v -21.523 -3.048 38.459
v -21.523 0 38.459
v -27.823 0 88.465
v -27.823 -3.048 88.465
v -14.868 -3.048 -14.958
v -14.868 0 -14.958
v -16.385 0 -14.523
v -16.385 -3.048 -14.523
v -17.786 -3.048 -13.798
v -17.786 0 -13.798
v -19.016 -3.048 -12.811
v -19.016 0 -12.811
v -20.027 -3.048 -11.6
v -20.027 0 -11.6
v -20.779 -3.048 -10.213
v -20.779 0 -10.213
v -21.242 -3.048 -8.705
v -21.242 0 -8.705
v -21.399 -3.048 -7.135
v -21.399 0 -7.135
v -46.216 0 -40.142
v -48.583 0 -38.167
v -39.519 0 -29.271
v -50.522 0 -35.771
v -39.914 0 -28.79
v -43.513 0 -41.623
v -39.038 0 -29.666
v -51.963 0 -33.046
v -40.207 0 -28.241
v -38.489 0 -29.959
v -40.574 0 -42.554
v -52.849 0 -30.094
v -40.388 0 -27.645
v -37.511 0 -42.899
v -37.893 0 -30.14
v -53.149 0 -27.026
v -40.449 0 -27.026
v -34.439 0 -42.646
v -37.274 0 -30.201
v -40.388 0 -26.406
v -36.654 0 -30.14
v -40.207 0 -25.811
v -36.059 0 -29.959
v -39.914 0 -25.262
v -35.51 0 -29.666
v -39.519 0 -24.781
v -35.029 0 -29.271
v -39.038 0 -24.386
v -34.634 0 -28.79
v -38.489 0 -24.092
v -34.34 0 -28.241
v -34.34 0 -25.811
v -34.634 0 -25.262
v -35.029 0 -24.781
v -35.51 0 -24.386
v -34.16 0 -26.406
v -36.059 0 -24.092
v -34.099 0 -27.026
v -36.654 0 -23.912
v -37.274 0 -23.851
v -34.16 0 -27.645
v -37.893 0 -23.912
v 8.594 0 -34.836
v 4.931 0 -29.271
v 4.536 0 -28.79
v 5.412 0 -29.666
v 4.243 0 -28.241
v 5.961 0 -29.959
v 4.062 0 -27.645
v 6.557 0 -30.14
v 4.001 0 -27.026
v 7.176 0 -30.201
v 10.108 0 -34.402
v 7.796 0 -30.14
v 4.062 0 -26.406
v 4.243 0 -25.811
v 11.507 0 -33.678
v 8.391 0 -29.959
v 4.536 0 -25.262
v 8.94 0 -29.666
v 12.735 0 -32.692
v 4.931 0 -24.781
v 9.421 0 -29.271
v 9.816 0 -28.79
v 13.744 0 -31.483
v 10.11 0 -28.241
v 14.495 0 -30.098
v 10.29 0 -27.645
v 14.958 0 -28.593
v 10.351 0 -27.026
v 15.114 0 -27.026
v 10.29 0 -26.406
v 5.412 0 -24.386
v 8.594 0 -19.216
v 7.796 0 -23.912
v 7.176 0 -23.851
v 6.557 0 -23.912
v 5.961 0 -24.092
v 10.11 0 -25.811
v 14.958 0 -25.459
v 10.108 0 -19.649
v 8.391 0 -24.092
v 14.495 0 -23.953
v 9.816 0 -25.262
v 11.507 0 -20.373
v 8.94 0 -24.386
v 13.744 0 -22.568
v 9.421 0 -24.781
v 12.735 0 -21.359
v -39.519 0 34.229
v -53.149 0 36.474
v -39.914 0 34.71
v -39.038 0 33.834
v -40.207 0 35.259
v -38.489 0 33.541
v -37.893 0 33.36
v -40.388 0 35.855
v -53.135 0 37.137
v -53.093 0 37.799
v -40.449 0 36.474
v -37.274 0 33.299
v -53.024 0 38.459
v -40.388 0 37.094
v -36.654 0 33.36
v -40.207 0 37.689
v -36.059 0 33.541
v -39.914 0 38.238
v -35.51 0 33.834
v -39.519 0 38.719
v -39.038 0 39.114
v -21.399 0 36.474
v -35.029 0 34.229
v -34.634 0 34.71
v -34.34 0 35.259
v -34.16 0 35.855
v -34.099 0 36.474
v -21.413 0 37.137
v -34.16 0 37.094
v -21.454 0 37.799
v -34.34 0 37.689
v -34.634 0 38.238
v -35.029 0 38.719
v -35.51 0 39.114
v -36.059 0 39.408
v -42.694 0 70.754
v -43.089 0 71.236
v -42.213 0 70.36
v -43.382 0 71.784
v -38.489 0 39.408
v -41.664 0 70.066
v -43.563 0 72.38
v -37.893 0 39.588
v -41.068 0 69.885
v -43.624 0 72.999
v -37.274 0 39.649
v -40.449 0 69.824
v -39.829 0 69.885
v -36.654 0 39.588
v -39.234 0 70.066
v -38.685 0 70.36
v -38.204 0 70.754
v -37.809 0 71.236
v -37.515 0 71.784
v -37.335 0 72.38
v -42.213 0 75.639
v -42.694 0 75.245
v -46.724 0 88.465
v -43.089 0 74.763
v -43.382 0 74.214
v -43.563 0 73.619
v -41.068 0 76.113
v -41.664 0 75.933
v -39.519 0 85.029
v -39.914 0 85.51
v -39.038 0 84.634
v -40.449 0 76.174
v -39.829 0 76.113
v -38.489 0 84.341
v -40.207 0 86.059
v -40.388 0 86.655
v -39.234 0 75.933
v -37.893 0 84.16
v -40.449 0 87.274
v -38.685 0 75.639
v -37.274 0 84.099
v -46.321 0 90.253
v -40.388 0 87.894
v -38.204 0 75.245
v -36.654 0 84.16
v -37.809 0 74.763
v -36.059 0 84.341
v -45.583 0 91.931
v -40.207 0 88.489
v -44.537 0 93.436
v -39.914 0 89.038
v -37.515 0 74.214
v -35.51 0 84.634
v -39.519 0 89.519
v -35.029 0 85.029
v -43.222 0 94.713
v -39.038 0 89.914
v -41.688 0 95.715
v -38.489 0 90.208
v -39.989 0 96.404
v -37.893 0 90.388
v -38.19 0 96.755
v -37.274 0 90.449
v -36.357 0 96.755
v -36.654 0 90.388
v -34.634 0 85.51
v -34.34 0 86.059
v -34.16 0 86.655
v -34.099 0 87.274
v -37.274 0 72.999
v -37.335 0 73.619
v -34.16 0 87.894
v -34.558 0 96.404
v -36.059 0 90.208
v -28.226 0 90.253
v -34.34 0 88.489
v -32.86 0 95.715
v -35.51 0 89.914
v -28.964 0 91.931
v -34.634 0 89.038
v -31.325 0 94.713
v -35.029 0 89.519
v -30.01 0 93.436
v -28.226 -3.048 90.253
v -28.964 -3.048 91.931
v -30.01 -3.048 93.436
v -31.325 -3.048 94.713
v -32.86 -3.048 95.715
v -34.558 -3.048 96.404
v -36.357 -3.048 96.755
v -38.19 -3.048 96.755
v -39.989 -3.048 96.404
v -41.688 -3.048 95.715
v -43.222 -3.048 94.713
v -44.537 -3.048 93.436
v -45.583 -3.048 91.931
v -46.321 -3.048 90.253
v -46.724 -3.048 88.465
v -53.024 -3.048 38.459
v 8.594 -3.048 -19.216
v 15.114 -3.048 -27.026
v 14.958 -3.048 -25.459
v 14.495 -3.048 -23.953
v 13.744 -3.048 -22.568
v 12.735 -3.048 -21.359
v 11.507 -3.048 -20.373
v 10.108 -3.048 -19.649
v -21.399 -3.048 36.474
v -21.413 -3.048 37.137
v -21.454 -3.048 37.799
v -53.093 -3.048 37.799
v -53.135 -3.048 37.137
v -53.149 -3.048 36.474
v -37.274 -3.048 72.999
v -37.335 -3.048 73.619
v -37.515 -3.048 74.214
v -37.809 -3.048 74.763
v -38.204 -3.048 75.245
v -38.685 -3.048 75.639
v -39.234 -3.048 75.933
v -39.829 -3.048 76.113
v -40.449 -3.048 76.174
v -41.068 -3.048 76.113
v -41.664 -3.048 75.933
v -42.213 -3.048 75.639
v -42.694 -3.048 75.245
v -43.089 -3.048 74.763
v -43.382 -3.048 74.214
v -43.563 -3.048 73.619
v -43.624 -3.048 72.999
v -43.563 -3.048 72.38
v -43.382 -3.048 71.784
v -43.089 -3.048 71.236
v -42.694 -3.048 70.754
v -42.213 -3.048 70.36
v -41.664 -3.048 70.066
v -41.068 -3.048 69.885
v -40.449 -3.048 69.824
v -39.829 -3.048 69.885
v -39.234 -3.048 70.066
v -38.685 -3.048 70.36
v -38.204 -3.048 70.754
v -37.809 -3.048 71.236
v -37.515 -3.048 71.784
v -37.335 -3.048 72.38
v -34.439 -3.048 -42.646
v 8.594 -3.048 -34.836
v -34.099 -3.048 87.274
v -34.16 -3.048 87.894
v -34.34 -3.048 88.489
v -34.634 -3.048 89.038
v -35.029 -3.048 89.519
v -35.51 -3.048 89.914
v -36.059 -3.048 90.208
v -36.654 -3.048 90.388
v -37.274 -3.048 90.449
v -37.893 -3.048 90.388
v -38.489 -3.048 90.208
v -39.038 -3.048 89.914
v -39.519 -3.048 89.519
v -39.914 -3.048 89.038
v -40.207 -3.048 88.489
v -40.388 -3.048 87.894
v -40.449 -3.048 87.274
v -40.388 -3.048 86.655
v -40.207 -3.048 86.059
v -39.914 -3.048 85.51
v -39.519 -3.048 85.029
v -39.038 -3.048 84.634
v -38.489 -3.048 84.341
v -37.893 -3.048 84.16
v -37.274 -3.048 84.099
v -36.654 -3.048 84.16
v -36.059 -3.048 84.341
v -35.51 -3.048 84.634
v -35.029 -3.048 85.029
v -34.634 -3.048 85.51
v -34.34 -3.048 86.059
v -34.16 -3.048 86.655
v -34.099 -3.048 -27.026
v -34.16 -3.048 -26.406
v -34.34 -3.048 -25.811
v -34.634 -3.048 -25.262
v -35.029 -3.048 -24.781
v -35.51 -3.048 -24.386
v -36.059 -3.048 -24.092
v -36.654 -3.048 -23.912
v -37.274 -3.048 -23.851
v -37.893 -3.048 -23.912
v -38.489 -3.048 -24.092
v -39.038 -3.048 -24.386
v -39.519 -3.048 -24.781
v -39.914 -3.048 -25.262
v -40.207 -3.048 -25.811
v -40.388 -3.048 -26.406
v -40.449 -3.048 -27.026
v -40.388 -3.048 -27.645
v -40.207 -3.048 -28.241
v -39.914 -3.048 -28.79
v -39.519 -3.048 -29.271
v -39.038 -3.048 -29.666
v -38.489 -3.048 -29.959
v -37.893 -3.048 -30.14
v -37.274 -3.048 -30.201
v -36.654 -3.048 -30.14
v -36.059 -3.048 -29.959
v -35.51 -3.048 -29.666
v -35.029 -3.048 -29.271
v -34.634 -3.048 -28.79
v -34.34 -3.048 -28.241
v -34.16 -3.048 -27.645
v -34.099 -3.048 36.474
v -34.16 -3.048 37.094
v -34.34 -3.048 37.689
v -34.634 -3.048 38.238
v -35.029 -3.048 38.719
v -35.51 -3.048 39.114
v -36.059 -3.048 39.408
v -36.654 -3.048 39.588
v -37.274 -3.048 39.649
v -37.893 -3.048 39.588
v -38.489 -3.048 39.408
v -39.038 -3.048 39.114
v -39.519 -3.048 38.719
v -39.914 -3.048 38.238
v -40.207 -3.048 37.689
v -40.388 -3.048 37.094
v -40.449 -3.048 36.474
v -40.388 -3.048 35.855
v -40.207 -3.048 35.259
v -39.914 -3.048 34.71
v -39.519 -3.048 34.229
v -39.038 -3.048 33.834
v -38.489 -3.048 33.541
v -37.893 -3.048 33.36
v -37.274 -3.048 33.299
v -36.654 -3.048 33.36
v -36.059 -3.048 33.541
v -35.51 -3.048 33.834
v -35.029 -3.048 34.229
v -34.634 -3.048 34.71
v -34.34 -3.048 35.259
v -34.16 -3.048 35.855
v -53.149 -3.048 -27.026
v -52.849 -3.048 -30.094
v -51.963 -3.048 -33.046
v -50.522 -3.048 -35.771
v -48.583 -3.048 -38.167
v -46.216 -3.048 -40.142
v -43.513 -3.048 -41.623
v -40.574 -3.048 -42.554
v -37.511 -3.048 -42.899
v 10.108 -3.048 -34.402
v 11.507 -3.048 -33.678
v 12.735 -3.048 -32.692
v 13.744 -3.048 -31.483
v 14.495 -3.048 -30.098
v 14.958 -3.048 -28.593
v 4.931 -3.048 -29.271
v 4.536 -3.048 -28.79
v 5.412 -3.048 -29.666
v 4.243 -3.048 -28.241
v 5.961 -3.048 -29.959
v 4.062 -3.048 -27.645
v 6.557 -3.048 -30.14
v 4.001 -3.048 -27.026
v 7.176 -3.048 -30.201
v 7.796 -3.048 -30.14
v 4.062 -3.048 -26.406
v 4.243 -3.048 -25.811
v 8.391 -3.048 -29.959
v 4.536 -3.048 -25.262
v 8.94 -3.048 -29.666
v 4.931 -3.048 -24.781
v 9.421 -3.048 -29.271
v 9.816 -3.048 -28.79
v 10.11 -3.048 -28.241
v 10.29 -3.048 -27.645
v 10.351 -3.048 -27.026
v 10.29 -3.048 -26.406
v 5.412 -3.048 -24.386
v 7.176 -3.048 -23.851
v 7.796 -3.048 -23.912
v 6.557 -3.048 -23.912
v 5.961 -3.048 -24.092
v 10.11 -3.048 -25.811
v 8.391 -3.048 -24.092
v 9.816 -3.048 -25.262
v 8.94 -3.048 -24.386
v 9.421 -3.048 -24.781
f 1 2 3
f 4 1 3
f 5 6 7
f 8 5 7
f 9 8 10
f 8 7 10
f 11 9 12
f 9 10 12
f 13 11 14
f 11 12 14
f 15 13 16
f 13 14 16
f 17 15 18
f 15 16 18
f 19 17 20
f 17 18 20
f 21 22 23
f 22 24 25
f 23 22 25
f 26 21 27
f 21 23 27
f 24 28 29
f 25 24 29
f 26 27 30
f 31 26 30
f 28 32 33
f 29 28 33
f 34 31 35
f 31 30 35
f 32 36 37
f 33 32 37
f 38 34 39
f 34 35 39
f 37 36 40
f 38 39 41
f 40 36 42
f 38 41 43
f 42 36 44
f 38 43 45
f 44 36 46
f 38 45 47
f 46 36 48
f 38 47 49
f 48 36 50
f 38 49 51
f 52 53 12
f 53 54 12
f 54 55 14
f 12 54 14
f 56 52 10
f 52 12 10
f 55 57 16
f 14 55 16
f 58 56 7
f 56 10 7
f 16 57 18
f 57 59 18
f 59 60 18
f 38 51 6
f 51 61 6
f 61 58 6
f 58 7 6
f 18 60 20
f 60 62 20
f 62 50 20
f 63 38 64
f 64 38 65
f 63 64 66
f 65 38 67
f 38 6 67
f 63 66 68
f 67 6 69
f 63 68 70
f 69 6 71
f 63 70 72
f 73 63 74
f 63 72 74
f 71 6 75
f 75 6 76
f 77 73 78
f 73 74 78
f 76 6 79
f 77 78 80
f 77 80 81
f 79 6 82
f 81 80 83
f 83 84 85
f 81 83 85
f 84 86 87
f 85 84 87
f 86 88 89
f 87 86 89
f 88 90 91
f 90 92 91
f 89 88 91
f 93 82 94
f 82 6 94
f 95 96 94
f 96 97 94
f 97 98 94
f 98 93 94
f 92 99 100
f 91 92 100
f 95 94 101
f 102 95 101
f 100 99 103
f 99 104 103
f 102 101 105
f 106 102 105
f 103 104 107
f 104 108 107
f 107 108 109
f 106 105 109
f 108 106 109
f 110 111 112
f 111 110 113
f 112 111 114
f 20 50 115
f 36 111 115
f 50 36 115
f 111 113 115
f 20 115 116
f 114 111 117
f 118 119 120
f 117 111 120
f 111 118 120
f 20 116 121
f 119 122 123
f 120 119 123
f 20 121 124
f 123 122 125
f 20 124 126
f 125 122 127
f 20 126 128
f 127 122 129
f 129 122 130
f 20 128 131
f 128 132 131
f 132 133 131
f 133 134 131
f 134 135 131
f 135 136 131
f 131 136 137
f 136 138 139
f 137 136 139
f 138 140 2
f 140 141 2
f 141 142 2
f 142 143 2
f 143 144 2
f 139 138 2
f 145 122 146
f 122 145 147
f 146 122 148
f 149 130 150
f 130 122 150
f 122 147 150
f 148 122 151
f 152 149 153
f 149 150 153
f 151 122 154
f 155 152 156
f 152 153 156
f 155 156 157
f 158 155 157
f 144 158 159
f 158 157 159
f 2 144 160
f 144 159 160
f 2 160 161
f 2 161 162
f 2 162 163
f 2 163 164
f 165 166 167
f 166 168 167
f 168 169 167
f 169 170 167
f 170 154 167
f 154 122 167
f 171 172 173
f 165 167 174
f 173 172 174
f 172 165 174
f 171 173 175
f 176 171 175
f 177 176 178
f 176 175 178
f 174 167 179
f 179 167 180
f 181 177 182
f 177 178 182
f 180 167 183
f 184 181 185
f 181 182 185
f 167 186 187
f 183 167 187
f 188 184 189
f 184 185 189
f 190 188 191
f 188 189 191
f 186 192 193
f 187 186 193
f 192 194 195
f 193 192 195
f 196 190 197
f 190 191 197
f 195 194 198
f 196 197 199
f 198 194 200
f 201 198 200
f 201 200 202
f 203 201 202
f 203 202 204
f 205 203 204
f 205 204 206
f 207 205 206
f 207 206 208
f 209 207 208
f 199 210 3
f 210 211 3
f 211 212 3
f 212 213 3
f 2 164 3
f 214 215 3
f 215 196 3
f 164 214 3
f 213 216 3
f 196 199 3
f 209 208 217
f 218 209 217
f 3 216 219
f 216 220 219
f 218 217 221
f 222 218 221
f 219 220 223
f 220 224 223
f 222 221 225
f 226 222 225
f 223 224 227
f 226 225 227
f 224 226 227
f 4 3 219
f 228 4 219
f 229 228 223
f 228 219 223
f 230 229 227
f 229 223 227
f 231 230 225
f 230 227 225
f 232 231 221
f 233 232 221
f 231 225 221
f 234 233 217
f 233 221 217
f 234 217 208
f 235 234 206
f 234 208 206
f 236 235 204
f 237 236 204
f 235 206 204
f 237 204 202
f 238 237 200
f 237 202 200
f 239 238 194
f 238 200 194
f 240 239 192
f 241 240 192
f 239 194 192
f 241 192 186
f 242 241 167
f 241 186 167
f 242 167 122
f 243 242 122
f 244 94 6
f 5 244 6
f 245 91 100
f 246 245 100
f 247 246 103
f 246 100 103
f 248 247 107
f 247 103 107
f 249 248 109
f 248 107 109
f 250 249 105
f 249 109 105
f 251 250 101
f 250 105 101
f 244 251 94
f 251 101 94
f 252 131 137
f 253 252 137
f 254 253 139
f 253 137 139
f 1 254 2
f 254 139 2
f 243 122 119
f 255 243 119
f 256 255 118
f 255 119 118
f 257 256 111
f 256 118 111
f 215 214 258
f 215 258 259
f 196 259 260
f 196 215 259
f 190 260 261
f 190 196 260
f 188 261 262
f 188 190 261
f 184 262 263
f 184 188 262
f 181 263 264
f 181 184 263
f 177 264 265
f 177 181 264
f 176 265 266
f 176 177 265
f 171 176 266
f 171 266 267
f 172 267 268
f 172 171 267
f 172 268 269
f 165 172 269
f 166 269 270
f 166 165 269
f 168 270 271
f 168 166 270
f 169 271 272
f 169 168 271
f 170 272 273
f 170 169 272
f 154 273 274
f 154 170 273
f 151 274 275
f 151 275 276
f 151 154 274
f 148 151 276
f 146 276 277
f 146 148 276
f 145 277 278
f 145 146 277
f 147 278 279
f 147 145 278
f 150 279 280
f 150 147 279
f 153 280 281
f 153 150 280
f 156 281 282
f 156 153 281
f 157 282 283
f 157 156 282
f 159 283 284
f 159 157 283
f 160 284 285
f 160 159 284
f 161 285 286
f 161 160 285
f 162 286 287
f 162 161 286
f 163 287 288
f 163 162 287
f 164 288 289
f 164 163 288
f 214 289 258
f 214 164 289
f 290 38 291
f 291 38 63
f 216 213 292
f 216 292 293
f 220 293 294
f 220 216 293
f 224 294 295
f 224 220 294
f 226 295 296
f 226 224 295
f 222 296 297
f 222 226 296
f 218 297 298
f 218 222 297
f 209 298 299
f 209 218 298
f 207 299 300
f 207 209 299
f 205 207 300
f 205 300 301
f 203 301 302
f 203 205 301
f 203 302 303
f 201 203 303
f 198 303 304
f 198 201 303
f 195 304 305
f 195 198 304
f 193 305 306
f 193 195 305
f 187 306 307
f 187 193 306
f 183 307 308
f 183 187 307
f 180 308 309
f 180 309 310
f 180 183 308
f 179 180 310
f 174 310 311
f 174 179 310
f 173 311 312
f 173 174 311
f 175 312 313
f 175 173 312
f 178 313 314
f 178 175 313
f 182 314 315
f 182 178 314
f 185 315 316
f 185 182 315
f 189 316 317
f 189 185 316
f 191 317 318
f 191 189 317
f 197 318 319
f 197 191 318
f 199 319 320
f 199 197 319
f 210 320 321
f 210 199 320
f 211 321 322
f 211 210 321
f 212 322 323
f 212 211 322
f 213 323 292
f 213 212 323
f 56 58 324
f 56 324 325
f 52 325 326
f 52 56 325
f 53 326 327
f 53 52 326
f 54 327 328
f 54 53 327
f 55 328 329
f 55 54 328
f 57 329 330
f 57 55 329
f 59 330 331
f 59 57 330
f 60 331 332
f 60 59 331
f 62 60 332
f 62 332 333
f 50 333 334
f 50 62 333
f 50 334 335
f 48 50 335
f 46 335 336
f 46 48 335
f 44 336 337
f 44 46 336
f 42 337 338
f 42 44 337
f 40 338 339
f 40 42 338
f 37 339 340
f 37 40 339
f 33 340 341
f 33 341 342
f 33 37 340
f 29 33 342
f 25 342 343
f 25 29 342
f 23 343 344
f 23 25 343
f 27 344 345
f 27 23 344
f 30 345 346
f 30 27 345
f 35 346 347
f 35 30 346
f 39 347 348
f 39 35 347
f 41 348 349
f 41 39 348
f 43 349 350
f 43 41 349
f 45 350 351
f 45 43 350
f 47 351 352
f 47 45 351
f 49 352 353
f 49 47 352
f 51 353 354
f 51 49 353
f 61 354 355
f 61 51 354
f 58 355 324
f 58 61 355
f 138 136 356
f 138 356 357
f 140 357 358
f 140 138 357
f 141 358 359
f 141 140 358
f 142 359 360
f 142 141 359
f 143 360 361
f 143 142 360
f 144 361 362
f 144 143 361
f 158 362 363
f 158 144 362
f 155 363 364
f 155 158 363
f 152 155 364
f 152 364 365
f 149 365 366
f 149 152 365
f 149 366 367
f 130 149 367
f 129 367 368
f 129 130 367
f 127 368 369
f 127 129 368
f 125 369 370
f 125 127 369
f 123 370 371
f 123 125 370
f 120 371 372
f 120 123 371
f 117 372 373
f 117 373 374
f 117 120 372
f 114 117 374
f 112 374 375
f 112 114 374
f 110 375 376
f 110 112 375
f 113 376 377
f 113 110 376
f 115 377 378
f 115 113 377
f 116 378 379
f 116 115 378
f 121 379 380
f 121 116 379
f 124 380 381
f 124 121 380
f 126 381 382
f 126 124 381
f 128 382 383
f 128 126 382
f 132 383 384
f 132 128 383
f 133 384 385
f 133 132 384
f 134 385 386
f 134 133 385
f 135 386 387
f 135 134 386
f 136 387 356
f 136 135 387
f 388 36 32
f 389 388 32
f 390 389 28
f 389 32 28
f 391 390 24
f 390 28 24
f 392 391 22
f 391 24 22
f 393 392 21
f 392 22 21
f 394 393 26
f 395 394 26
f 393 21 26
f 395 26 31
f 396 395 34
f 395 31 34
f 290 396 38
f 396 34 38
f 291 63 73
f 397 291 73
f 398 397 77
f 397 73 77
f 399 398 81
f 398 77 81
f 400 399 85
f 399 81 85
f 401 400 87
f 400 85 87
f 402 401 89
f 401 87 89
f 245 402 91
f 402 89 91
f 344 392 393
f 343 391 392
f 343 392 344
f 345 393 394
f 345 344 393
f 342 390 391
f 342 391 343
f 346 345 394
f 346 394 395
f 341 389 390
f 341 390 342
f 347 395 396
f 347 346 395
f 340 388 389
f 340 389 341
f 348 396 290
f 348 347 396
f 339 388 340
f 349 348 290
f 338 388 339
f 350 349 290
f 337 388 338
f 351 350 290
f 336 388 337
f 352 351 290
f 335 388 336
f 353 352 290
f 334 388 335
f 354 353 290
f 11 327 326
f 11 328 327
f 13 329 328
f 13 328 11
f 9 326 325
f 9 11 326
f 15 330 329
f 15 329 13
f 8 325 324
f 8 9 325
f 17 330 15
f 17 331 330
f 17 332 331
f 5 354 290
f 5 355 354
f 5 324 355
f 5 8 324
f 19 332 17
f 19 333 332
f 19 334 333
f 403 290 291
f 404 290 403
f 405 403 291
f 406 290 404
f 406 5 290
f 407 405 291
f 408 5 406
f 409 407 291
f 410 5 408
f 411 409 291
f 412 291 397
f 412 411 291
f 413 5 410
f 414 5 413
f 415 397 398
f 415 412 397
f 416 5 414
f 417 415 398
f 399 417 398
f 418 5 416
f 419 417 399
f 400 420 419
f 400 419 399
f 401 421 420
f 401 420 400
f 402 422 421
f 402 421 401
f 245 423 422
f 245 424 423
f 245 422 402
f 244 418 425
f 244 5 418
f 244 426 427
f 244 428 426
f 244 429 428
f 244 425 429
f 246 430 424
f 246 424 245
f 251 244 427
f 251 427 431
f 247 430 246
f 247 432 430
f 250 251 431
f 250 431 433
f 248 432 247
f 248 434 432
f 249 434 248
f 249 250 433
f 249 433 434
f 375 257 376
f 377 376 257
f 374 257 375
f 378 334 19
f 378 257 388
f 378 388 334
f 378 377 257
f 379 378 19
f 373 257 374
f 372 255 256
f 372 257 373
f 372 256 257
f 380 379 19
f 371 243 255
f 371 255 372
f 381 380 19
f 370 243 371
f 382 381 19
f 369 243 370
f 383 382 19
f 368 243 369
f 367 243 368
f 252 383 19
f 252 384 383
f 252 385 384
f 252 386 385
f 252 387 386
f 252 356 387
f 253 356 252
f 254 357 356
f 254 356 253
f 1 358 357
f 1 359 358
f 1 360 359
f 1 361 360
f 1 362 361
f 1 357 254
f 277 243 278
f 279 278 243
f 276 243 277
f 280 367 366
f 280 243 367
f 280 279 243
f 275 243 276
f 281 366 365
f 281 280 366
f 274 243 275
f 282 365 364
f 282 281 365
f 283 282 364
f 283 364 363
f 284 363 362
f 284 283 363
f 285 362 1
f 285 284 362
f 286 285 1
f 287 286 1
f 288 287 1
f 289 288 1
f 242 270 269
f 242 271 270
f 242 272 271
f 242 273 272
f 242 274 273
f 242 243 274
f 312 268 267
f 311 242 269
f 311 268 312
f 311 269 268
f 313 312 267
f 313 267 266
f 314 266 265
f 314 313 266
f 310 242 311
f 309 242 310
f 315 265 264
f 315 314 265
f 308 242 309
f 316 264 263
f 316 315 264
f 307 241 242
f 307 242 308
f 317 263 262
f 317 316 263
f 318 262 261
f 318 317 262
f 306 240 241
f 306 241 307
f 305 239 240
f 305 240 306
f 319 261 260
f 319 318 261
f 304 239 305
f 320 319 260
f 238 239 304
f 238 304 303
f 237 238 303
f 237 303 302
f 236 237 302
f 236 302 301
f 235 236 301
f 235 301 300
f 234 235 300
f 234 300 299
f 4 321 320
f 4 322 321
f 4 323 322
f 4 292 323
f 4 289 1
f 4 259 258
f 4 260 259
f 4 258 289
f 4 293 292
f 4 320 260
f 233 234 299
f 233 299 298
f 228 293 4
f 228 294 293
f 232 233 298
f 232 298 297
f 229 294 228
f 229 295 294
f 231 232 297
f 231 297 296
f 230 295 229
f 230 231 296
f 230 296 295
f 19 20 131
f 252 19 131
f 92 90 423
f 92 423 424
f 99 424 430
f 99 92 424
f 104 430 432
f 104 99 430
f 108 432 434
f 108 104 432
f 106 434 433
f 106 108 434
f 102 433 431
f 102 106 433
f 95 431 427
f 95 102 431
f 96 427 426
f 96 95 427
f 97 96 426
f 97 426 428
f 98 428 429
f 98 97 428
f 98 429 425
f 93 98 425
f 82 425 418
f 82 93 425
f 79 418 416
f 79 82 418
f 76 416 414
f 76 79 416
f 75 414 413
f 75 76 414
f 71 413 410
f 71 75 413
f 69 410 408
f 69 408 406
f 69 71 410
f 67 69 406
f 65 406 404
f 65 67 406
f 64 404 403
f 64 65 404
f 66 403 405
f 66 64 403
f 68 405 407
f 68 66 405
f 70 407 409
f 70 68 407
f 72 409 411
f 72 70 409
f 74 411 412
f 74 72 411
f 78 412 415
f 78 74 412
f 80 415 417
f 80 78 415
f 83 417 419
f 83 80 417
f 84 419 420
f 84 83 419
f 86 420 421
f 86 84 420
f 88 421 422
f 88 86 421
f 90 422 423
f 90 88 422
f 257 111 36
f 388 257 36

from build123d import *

# Parameters (mm, degrees)
F0_R     = 3.175
F1_DEPTH = 3.048


with BuildPart() as f1:
    # F0 (on Front) → F1 (new body)
    with BuildSketch(Plane.XZ):
        with BuildLine():
            ThreePointArc((-27.823383, 88.464874), (-27.767371, 87.870732), (-27.748676, 87.274249))
            ThreePointArc((-27.748676, 87.274249), (-37.870159, 77.767944), (-46.723969, 88.464874))
            Line((-46.723969, 88.464874), (-53.024164, 38.458624))
            ThreePointArc((-53.024164, 38.458624), (-37.273676, 52.349249), (-21.523187, 38.458624))
            Line((-21.523187, 38.458624), (-27.823383, 88.464874))
        make_face()
        with Locations((-40.448676, 72.999449)):
            Circle(F0_R, mode=Mode.SUBTRACT)
        with BuildLine():
            ThreePointArc((-46.723969, 88.464874), (-37.870159, 77.767944), (-27.748676, 87.274249))
            ThreePointArc((-27.748676, 87.274249), (-27.767371, 87.870732), (-27.823383, 88.464874))
            ThreePointArc((-27.823383, 88.464874), (-37.273676, 96.799249), (-46.723969, 88.464874))
        make_face()
        with Locations((-37.273676, 87.274249)):
            Circle(F0_R, mode=Mode.SUBTRACT)
        with BuildLine():
            ThreePointArc((-21.398676, 36.474249), (-21.429834, 37.468387), (-21.523187, 38.458624))
            ThreePointArc((-21.523187, 38.458624), (-37.273676, 52.349249), (-53.024164, 38.458624))
            ThreePointArc((-53.024164, 38.458624), (-53.117517, 37.468387), (-53.148676, 36.474249))
            ThreePointArc((-53.148676, 36.474249), (-37.273676, 20.599249), (-21.398676, 36.474249))
        make_face()
        with Locations((-37.273676, 36.474249)):
            Circle(F0_R, mode=Mode.SUBTRACT)
        with BuildLine():
            Line((-21.398676, -7.135352), (-21.398676, 36.474249))
            ThreePointArc((-21.398676, 36.474249), (-37.273676, 20.599249), (-53.148676, 36.474249))
            Line((-53.148676, 36.474249), (-53.148676, -27.025751))
            ThreePointArc((-53.148676, -27.025751), (-37.273676, -11.150751), (-21.398676, -27.025751))
            ThreePointArc((-21.398676, -27.025751), (-25.08724, -37.199562), (-34.438854, -42.645592))
            Line((-34.438854, -42.645592), (8.593735, -34.835671))
            ThreePointArc((8.593735, -34.835671), (-0.761176, -27.025751), (8.593735, -19.215831))
            Line((8.593735, -19.215831), (-14.868154, -14.957768))
            ThreePointArc((-14.868154, -14.957768), (-19.551442, -12.230396), (-21.398676, -7.135352))
        make_face()
        with BuildLine():
            ThreePointArc((-21.398676, -27.025751), (-37.273676, -11.150751), (-53.148676, -27.025751))
            ThreePointArc((-53.148676, -27.025751), (-47.447486, -39.212187), (-34.438854, -42.645592))
            ThreePointArc((-34.438854, -42.645592), (-25.08724, -37.199562), (-21.398676, -27.025751))
        make_face()
        with Locations((-37.273676, -27.025751)):
            Circle(F0_R, mode=Mode.SUBTRACT)
        with BuildLine():
            ThreePointArc((15.113824, -27.025751), (13.269542, -21.938846), (8.593735, -19.215831))
            ThreePointArc((8.593735, -19.215831), (-0.761176, -27.025751), (8.593735, -34.835671))
            ThreePointArc((8.593735, -34.835671), (13.269542, -32.112656), (15.113824, -27.025751))
        make_face()
        with Locations((7.176324, -27.025751)):
            Circle(F0_R, mode=Mode.SUBTRACT)
    extrude(amount=F1_DEPTH)


solid = f1.part
